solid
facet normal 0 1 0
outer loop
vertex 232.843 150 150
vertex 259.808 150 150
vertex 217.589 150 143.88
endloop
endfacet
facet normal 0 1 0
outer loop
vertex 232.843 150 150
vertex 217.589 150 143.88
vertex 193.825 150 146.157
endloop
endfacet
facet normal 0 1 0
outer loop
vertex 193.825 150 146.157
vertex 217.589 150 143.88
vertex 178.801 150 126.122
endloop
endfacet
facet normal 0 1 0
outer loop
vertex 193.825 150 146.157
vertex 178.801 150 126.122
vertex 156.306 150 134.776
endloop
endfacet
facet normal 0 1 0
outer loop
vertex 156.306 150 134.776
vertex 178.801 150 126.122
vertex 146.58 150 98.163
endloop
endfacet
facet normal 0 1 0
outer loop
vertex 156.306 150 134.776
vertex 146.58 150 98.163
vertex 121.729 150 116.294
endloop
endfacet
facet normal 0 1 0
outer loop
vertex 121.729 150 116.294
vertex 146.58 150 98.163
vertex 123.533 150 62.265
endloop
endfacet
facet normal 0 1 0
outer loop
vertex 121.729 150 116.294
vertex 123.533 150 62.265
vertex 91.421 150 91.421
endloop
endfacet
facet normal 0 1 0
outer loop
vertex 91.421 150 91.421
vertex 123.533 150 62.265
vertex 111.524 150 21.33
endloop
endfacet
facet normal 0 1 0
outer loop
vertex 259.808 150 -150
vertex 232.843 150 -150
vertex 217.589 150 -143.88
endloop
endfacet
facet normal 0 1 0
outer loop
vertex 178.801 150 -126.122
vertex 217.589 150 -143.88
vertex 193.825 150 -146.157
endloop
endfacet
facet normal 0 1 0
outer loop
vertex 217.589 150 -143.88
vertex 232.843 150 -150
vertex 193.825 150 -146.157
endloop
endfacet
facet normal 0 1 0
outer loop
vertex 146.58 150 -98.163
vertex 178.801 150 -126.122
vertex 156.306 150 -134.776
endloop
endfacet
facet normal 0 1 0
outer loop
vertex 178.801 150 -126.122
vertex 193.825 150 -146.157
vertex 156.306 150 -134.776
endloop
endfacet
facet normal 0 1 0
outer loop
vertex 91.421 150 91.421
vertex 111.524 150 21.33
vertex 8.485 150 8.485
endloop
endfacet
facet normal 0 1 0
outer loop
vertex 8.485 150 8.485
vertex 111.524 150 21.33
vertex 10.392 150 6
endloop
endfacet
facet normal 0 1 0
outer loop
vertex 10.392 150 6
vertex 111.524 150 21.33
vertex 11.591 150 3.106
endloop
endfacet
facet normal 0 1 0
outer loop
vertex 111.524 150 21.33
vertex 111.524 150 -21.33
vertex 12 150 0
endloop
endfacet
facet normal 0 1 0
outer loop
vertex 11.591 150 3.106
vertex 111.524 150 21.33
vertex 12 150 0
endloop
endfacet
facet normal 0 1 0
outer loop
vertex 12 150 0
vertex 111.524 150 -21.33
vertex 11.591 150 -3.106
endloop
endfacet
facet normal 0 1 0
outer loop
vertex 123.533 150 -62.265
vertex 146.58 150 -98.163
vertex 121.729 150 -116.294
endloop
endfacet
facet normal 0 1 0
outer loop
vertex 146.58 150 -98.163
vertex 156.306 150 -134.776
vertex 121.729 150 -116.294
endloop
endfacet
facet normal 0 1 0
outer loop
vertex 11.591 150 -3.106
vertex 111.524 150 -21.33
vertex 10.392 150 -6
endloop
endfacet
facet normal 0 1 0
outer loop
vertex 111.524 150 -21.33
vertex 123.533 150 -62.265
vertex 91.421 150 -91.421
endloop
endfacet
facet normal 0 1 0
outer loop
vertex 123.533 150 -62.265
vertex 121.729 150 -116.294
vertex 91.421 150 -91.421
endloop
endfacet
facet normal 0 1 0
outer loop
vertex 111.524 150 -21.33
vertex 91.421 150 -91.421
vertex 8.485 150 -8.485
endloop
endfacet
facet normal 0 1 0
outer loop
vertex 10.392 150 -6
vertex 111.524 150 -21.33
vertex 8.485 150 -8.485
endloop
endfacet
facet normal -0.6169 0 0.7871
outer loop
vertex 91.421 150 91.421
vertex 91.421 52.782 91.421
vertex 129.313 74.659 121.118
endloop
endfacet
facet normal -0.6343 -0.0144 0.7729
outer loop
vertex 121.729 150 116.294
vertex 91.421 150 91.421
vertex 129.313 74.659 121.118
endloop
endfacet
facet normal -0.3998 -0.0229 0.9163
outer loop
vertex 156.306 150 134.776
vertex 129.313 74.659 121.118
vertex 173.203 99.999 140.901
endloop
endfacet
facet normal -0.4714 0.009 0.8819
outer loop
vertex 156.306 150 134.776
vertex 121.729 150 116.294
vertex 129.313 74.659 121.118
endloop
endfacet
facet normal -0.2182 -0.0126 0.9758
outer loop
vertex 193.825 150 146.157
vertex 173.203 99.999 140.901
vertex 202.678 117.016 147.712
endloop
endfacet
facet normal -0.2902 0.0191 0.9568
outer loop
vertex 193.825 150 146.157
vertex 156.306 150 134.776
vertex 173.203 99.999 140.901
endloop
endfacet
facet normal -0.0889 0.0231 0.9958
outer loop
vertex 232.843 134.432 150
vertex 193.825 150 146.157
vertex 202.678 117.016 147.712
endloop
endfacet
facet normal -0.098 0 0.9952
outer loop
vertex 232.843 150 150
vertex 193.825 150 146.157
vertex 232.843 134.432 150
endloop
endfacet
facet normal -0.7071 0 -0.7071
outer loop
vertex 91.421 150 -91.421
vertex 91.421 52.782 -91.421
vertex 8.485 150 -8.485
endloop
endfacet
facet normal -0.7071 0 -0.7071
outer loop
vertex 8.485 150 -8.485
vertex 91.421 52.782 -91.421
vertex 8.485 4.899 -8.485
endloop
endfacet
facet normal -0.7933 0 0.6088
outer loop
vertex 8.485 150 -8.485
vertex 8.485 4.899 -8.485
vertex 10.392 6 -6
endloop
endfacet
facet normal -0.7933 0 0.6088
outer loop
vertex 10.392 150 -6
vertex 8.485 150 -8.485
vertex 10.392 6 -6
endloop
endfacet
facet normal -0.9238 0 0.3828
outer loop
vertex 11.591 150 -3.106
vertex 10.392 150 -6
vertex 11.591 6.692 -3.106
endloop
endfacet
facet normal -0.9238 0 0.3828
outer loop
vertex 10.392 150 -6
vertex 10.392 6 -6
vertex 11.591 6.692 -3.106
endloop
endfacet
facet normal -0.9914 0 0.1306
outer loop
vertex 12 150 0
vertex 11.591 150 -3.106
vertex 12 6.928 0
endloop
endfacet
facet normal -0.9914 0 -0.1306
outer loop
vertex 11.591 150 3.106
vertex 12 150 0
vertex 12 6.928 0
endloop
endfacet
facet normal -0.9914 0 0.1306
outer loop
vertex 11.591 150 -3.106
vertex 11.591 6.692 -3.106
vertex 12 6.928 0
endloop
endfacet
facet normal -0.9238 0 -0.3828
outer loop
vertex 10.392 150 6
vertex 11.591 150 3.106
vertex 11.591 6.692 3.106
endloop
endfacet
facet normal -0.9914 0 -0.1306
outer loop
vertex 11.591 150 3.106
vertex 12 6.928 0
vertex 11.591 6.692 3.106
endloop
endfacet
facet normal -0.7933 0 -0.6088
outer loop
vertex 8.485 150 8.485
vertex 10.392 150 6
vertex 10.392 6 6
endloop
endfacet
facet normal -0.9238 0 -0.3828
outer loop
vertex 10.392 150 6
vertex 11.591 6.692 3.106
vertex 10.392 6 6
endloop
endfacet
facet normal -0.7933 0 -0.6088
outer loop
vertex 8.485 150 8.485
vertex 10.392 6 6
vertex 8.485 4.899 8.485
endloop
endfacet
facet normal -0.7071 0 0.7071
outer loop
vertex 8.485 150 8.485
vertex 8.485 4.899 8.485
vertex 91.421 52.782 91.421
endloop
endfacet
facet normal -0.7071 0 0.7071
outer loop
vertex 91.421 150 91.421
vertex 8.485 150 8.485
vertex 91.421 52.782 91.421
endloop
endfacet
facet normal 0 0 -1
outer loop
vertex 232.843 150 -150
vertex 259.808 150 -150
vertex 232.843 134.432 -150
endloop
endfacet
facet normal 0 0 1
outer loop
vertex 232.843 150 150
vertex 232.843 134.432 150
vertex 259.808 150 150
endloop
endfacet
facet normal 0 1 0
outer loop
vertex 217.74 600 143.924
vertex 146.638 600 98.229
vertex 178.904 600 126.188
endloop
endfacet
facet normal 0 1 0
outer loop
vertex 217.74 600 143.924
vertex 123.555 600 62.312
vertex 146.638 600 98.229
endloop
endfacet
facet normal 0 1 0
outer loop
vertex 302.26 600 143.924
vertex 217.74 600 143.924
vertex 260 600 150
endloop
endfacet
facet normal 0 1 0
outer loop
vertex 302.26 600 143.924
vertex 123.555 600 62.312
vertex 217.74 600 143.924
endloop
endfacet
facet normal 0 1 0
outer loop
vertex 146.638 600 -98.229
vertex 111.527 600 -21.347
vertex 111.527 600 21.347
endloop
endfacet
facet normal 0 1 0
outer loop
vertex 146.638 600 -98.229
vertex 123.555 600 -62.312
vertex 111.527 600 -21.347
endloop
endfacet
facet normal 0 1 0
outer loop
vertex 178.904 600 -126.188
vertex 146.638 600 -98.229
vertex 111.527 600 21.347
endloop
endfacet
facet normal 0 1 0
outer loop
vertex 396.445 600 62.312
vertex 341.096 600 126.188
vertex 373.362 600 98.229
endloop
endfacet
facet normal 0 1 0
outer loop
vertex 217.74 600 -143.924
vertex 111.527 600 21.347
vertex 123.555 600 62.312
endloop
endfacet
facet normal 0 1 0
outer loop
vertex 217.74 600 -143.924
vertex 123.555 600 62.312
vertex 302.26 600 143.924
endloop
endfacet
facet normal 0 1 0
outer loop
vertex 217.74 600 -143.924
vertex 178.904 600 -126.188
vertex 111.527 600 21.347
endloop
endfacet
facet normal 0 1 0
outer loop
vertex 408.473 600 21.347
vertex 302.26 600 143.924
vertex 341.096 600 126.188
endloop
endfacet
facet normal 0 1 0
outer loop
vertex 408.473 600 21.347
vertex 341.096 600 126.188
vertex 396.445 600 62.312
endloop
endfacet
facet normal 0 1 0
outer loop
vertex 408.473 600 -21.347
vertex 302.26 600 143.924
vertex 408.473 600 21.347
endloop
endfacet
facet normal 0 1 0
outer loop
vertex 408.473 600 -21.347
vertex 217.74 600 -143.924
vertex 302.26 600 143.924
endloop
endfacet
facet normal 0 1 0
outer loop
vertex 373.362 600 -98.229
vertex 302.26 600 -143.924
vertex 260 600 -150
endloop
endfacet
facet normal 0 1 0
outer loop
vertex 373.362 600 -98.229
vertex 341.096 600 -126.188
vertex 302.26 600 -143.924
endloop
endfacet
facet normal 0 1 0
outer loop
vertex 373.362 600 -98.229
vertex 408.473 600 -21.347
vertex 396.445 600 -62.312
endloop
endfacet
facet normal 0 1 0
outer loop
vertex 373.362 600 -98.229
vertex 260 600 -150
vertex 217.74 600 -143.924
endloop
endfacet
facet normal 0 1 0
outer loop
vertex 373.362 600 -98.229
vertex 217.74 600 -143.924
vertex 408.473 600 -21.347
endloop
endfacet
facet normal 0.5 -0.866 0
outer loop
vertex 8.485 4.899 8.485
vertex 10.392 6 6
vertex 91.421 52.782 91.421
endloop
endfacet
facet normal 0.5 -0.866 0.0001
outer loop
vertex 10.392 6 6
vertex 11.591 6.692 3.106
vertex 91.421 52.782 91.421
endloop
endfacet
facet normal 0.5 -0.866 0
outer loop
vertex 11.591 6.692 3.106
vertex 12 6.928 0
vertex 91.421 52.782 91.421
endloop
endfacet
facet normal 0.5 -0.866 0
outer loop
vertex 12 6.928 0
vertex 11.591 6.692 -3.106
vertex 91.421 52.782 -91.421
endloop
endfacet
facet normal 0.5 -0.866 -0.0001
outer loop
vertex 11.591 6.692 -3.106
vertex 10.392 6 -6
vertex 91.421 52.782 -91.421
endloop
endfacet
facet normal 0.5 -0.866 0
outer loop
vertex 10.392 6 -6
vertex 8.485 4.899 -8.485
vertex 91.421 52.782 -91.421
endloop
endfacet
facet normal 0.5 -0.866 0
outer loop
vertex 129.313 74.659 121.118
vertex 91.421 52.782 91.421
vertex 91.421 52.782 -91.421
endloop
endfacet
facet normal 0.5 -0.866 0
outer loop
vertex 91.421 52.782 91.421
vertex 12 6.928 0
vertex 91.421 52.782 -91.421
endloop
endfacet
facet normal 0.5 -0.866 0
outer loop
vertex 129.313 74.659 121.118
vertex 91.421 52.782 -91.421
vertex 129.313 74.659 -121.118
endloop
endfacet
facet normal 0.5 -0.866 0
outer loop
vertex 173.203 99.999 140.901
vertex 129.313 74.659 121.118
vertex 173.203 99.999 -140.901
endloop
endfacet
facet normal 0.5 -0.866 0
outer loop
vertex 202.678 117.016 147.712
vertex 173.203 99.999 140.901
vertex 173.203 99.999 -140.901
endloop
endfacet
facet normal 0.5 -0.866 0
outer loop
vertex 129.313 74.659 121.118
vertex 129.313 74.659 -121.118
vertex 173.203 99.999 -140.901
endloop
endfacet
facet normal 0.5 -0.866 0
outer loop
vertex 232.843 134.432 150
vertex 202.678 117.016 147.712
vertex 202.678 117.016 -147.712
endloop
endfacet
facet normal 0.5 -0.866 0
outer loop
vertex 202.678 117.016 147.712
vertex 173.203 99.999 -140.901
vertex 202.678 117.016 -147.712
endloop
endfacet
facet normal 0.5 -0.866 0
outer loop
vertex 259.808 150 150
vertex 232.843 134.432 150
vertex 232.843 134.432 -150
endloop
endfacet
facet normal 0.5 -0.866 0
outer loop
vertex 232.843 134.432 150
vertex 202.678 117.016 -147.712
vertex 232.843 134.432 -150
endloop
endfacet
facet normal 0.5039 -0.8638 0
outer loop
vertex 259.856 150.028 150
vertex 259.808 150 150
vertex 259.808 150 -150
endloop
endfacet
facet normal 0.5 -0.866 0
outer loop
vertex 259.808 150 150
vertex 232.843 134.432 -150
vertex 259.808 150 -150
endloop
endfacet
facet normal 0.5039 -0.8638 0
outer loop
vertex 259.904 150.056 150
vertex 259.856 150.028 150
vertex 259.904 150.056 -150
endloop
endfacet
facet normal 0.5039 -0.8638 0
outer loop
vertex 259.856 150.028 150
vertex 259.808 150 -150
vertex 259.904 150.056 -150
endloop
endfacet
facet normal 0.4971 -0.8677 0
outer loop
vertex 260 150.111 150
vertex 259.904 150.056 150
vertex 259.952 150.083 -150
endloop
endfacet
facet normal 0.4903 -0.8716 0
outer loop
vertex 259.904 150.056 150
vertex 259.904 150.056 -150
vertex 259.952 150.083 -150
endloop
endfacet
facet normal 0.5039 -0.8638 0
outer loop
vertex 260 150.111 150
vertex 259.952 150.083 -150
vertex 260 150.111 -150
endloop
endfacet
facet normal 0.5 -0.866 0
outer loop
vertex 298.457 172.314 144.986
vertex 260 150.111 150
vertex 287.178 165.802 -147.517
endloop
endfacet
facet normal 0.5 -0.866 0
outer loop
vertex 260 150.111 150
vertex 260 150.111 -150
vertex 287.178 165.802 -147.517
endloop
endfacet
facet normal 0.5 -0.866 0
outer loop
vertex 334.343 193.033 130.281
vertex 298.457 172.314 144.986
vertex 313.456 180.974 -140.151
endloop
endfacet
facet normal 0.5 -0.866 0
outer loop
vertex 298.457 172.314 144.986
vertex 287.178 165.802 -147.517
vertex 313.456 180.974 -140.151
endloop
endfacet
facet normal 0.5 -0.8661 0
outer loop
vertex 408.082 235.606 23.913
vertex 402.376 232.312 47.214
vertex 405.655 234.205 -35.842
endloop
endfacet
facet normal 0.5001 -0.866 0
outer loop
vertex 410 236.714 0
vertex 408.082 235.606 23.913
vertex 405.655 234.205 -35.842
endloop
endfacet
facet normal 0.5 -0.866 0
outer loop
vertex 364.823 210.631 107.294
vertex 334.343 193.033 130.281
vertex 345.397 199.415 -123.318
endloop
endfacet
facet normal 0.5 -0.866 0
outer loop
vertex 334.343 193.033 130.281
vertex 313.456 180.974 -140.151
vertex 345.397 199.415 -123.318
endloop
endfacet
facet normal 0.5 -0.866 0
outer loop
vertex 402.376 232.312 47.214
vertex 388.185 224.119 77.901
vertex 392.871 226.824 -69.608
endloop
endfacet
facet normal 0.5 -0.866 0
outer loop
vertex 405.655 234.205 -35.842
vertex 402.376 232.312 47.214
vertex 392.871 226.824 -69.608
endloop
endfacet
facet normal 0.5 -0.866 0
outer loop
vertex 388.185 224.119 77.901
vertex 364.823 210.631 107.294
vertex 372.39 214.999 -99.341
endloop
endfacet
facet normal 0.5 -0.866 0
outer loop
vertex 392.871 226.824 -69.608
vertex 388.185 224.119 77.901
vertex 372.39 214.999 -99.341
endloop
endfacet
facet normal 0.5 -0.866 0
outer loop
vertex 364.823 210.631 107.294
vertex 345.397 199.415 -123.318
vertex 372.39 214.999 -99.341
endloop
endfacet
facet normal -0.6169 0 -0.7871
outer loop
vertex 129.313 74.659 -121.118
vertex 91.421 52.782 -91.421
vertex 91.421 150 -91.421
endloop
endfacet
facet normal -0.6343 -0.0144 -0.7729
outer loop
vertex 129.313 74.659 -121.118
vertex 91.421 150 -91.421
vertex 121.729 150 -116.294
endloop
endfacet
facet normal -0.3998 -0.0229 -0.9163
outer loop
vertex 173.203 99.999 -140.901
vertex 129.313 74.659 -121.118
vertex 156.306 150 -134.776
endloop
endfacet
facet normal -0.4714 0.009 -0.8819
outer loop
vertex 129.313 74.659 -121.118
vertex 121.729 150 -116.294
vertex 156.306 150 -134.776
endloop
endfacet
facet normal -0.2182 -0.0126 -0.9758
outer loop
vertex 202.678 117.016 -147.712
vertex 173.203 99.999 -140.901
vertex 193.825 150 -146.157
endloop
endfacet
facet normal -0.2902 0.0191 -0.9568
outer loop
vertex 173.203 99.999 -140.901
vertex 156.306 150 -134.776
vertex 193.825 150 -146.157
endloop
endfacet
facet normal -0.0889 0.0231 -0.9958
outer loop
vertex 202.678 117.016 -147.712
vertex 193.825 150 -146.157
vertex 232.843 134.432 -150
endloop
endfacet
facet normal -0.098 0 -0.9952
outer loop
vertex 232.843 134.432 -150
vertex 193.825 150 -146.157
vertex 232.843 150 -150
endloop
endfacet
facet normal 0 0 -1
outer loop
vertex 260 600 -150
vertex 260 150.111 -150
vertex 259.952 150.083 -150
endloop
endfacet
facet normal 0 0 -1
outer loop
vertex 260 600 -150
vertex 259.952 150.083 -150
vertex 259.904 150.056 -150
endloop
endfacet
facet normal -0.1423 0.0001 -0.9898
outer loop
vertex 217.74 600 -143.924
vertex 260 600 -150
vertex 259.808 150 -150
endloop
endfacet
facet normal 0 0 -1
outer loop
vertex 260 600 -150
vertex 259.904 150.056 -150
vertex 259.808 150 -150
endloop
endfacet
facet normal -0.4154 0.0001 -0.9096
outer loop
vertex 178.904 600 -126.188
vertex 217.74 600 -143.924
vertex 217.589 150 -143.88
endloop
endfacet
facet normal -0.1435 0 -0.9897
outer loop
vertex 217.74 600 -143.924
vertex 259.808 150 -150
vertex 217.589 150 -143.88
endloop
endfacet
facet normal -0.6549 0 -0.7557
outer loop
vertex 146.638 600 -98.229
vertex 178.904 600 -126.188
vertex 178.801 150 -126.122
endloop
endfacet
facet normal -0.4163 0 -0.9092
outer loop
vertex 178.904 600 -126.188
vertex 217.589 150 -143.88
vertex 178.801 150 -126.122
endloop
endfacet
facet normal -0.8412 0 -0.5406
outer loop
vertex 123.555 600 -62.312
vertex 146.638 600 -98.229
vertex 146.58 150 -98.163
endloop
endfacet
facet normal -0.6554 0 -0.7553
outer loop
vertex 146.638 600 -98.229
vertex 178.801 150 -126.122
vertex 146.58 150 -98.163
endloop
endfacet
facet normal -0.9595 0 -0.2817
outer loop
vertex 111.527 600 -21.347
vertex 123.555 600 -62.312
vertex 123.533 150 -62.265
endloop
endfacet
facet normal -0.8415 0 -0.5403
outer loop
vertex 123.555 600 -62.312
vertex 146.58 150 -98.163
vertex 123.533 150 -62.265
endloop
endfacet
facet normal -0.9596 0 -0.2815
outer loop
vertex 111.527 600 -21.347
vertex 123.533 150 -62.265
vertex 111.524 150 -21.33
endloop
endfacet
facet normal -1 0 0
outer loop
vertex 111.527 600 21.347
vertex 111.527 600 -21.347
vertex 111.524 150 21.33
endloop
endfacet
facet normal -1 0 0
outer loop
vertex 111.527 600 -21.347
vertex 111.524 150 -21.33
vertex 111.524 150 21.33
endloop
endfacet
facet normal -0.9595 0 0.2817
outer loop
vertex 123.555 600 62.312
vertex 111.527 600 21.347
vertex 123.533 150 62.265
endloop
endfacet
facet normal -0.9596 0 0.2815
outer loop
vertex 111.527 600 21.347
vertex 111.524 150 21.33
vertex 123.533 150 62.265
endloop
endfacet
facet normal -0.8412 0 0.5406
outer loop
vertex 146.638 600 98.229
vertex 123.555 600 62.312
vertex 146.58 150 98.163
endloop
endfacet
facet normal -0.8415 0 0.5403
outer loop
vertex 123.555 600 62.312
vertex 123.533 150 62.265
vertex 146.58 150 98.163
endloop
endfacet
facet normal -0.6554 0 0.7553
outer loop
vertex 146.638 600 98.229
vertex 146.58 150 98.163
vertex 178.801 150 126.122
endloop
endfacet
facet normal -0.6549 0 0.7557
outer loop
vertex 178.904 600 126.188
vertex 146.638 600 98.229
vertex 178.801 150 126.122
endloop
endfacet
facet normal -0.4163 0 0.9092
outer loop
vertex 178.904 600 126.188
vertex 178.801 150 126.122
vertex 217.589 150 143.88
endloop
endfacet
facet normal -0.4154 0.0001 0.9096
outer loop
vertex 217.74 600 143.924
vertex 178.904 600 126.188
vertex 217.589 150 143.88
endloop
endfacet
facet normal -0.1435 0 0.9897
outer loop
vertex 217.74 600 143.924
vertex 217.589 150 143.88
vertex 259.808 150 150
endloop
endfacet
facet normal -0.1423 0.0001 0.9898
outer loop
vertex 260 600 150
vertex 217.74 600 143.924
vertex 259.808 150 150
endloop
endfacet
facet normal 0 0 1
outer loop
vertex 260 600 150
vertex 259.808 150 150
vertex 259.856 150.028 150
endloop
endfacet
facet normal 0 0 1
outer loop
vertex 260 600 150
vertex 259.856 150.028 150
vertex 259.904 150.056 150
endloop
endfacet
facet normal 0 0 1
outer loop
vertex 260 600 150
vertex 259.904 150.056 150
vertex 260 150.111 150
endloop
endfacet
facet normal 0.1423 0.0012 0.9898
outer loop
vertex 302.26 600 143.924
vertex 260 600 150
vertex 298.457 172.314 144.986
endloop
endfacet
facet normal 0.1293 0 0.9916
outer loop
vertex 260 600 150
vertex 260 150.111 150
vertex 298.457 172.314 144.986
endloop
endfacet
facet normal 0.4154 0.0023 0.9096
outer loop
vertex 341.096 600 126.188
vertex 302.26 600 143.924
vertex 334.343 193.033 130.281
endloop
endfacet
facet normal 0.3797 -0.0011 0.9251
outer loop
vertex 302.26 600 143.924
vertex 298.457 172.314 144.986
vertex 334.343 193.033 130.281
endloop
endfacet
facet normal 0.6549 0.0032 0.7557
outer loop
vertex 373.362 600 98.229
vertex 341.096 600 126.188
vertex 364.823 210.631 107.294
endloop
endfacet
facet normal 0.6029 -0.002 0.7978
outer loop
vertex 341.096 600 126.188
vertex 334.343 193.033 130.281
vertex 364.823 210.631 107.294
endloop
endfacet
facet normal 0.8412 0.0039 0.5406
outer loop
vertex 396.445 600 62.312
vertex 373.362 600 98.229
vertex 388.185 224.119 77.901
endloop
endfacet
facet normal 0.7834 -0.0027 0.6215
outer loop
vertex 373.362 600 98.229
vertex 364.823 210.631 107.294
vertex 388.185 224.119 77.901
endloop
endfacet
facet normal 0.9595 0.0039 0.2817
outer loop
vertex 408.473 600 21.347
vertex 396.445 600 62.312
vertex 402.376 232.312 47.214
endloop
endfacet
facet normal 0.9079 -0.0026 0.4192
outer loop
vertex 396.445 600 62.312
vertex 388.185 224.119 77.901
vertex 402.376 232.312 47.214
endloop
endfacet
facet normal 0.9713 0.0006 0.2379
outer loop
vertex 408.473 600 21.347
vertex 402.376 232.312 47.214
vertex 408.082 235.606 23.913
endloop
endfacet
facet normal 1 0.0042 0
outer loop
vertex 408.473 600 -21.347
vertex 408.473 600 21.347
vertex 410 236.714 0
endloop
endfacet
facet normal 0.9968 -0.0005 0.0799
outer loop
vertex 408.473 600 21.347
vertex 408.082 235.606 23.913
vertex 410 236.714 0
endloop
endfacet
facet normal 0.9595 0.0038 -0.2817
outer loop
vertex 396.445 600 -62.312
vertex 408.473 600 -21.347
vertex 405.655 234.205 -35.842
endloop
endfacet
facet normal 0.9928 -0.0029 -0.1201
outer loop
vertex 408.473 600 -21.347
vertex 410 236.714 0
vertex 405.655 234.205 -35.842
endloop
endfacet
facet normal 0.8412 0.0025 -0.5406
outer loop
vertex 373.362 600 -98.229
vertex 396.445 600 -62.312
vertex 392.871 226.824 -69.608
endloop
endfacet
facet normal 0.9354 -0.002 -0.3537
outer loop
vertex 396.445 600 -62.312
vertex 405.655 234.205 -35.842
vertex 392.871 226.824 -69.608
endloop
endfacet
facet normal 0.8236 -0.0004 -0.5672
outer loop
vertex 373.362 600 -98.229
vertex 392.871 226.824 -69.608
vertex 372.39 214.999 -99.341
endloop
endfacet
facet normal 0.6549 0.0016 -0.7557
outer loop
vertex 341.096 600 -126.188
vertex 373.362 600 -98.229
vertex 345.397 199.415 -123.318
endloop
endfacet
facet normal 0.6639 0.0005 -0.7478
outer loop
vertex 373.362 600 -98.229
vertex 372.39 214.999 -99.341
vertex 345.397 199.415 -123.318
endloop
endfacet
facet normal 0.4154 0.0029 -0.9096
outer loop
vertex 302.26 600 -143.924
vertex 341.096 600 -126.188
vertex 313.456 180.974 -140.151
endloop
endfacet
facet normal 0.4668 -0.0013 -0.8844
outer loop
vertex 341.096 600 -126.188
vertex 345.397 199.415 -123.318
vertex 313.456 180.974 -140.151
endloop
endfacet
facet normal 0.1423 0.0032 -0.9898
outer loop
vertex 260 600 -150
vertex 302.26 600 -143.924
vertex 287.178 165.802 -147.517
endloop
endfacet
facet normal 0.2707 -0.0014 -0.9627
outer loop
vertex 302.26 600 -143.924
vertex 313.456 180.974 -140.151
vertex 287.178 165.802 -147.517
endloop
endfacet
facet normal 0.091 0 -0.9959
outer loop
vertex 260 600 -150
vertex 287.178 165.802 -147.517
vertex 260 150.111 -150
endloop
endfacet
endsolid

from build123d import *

# Parameters (mm, degrees)
BOSS_EXTRUDE1_DEPTH     = 600
CUT_EXTRUDE1_DEPTH      = 743.024258364
CUT_EXTRUDE1_DEPTH_BACK = 743.024258364
CUT_EXTRUDE2_START      = -450
CUT_EXTRUDE2_DEPTH      = 450
FILLET1_R               = 200


with BuildPart() as part:
    # Sketch1 → Boss-Extrude1 (new body)
    with BuildSketch(Plane(origin=(0, 0, 0), x_dir=(1, 0, 0), z_dir=(0, 1, 0))):
        with BuildLine():
            Line((8.485281374, -8.485281374), (150, -150))
            Line((150, -150), (260, -150))
            ThreePointArc((260, -150), (410, 0), (260, 150))
            Line((260, 150), (150, 150))
            Line((150, 150), (8.485281374, 8.485281374))
            ThreePointArc((8.485281374, 8.485281374), (12, 0), (8.485281374, -8.485281374))
        make_face()
    extrude(amount=BOSS_EXTRUDE1_DEPTH)

    # Sketch2 → Cut-Extrude1 (cut, two sides: drawn at the far end of the back side and taken through both)
    with BuildSketch(Plane.XY.offset(-CUT_EXTRUDE1_DEPTH_BACK)):
        Polygon((0, 0), (410, 236.713610368), (410, 0), align=None)
    extrude(amount=CUT_EXTRUDE1_DEPTH + CUT_EXTRUDE1_DEPTH_BACK, mode=Mode.SUBTRACT)

    # Sketch3 → Cut-Extrude2 (cut)
    with BuildSketch(Plane(origin=(0, 600, 0), x_dir=(1, 0, 0), z_dir=(0, 1, 0)).offset(CUT_EXTRUDE2_START)):
        with BuildLine():
            Line((0, 0), (150, 150))
            Line((150, 150), (260, 150))
            ThreePointArc((260, 150), (110, 0), (260, -150))
            Line((260, -150), (150, -150))
            Line((150, -150), (0, 0))
        make_face()
    extrude(amount=CUT_EXTRUDE2_DEPTH, mode=Mode.SUBTRACT)

    # Fillet1
    fillet1_edges = [part.edges().sort_by_distance(p)[0] for p in [
        (150, 118.301270189, 150),
        (150, 118.301270189, -150),
    ]]
    fillet(fillet1_edges, radius=FILLET1_R)


solid = part.part
